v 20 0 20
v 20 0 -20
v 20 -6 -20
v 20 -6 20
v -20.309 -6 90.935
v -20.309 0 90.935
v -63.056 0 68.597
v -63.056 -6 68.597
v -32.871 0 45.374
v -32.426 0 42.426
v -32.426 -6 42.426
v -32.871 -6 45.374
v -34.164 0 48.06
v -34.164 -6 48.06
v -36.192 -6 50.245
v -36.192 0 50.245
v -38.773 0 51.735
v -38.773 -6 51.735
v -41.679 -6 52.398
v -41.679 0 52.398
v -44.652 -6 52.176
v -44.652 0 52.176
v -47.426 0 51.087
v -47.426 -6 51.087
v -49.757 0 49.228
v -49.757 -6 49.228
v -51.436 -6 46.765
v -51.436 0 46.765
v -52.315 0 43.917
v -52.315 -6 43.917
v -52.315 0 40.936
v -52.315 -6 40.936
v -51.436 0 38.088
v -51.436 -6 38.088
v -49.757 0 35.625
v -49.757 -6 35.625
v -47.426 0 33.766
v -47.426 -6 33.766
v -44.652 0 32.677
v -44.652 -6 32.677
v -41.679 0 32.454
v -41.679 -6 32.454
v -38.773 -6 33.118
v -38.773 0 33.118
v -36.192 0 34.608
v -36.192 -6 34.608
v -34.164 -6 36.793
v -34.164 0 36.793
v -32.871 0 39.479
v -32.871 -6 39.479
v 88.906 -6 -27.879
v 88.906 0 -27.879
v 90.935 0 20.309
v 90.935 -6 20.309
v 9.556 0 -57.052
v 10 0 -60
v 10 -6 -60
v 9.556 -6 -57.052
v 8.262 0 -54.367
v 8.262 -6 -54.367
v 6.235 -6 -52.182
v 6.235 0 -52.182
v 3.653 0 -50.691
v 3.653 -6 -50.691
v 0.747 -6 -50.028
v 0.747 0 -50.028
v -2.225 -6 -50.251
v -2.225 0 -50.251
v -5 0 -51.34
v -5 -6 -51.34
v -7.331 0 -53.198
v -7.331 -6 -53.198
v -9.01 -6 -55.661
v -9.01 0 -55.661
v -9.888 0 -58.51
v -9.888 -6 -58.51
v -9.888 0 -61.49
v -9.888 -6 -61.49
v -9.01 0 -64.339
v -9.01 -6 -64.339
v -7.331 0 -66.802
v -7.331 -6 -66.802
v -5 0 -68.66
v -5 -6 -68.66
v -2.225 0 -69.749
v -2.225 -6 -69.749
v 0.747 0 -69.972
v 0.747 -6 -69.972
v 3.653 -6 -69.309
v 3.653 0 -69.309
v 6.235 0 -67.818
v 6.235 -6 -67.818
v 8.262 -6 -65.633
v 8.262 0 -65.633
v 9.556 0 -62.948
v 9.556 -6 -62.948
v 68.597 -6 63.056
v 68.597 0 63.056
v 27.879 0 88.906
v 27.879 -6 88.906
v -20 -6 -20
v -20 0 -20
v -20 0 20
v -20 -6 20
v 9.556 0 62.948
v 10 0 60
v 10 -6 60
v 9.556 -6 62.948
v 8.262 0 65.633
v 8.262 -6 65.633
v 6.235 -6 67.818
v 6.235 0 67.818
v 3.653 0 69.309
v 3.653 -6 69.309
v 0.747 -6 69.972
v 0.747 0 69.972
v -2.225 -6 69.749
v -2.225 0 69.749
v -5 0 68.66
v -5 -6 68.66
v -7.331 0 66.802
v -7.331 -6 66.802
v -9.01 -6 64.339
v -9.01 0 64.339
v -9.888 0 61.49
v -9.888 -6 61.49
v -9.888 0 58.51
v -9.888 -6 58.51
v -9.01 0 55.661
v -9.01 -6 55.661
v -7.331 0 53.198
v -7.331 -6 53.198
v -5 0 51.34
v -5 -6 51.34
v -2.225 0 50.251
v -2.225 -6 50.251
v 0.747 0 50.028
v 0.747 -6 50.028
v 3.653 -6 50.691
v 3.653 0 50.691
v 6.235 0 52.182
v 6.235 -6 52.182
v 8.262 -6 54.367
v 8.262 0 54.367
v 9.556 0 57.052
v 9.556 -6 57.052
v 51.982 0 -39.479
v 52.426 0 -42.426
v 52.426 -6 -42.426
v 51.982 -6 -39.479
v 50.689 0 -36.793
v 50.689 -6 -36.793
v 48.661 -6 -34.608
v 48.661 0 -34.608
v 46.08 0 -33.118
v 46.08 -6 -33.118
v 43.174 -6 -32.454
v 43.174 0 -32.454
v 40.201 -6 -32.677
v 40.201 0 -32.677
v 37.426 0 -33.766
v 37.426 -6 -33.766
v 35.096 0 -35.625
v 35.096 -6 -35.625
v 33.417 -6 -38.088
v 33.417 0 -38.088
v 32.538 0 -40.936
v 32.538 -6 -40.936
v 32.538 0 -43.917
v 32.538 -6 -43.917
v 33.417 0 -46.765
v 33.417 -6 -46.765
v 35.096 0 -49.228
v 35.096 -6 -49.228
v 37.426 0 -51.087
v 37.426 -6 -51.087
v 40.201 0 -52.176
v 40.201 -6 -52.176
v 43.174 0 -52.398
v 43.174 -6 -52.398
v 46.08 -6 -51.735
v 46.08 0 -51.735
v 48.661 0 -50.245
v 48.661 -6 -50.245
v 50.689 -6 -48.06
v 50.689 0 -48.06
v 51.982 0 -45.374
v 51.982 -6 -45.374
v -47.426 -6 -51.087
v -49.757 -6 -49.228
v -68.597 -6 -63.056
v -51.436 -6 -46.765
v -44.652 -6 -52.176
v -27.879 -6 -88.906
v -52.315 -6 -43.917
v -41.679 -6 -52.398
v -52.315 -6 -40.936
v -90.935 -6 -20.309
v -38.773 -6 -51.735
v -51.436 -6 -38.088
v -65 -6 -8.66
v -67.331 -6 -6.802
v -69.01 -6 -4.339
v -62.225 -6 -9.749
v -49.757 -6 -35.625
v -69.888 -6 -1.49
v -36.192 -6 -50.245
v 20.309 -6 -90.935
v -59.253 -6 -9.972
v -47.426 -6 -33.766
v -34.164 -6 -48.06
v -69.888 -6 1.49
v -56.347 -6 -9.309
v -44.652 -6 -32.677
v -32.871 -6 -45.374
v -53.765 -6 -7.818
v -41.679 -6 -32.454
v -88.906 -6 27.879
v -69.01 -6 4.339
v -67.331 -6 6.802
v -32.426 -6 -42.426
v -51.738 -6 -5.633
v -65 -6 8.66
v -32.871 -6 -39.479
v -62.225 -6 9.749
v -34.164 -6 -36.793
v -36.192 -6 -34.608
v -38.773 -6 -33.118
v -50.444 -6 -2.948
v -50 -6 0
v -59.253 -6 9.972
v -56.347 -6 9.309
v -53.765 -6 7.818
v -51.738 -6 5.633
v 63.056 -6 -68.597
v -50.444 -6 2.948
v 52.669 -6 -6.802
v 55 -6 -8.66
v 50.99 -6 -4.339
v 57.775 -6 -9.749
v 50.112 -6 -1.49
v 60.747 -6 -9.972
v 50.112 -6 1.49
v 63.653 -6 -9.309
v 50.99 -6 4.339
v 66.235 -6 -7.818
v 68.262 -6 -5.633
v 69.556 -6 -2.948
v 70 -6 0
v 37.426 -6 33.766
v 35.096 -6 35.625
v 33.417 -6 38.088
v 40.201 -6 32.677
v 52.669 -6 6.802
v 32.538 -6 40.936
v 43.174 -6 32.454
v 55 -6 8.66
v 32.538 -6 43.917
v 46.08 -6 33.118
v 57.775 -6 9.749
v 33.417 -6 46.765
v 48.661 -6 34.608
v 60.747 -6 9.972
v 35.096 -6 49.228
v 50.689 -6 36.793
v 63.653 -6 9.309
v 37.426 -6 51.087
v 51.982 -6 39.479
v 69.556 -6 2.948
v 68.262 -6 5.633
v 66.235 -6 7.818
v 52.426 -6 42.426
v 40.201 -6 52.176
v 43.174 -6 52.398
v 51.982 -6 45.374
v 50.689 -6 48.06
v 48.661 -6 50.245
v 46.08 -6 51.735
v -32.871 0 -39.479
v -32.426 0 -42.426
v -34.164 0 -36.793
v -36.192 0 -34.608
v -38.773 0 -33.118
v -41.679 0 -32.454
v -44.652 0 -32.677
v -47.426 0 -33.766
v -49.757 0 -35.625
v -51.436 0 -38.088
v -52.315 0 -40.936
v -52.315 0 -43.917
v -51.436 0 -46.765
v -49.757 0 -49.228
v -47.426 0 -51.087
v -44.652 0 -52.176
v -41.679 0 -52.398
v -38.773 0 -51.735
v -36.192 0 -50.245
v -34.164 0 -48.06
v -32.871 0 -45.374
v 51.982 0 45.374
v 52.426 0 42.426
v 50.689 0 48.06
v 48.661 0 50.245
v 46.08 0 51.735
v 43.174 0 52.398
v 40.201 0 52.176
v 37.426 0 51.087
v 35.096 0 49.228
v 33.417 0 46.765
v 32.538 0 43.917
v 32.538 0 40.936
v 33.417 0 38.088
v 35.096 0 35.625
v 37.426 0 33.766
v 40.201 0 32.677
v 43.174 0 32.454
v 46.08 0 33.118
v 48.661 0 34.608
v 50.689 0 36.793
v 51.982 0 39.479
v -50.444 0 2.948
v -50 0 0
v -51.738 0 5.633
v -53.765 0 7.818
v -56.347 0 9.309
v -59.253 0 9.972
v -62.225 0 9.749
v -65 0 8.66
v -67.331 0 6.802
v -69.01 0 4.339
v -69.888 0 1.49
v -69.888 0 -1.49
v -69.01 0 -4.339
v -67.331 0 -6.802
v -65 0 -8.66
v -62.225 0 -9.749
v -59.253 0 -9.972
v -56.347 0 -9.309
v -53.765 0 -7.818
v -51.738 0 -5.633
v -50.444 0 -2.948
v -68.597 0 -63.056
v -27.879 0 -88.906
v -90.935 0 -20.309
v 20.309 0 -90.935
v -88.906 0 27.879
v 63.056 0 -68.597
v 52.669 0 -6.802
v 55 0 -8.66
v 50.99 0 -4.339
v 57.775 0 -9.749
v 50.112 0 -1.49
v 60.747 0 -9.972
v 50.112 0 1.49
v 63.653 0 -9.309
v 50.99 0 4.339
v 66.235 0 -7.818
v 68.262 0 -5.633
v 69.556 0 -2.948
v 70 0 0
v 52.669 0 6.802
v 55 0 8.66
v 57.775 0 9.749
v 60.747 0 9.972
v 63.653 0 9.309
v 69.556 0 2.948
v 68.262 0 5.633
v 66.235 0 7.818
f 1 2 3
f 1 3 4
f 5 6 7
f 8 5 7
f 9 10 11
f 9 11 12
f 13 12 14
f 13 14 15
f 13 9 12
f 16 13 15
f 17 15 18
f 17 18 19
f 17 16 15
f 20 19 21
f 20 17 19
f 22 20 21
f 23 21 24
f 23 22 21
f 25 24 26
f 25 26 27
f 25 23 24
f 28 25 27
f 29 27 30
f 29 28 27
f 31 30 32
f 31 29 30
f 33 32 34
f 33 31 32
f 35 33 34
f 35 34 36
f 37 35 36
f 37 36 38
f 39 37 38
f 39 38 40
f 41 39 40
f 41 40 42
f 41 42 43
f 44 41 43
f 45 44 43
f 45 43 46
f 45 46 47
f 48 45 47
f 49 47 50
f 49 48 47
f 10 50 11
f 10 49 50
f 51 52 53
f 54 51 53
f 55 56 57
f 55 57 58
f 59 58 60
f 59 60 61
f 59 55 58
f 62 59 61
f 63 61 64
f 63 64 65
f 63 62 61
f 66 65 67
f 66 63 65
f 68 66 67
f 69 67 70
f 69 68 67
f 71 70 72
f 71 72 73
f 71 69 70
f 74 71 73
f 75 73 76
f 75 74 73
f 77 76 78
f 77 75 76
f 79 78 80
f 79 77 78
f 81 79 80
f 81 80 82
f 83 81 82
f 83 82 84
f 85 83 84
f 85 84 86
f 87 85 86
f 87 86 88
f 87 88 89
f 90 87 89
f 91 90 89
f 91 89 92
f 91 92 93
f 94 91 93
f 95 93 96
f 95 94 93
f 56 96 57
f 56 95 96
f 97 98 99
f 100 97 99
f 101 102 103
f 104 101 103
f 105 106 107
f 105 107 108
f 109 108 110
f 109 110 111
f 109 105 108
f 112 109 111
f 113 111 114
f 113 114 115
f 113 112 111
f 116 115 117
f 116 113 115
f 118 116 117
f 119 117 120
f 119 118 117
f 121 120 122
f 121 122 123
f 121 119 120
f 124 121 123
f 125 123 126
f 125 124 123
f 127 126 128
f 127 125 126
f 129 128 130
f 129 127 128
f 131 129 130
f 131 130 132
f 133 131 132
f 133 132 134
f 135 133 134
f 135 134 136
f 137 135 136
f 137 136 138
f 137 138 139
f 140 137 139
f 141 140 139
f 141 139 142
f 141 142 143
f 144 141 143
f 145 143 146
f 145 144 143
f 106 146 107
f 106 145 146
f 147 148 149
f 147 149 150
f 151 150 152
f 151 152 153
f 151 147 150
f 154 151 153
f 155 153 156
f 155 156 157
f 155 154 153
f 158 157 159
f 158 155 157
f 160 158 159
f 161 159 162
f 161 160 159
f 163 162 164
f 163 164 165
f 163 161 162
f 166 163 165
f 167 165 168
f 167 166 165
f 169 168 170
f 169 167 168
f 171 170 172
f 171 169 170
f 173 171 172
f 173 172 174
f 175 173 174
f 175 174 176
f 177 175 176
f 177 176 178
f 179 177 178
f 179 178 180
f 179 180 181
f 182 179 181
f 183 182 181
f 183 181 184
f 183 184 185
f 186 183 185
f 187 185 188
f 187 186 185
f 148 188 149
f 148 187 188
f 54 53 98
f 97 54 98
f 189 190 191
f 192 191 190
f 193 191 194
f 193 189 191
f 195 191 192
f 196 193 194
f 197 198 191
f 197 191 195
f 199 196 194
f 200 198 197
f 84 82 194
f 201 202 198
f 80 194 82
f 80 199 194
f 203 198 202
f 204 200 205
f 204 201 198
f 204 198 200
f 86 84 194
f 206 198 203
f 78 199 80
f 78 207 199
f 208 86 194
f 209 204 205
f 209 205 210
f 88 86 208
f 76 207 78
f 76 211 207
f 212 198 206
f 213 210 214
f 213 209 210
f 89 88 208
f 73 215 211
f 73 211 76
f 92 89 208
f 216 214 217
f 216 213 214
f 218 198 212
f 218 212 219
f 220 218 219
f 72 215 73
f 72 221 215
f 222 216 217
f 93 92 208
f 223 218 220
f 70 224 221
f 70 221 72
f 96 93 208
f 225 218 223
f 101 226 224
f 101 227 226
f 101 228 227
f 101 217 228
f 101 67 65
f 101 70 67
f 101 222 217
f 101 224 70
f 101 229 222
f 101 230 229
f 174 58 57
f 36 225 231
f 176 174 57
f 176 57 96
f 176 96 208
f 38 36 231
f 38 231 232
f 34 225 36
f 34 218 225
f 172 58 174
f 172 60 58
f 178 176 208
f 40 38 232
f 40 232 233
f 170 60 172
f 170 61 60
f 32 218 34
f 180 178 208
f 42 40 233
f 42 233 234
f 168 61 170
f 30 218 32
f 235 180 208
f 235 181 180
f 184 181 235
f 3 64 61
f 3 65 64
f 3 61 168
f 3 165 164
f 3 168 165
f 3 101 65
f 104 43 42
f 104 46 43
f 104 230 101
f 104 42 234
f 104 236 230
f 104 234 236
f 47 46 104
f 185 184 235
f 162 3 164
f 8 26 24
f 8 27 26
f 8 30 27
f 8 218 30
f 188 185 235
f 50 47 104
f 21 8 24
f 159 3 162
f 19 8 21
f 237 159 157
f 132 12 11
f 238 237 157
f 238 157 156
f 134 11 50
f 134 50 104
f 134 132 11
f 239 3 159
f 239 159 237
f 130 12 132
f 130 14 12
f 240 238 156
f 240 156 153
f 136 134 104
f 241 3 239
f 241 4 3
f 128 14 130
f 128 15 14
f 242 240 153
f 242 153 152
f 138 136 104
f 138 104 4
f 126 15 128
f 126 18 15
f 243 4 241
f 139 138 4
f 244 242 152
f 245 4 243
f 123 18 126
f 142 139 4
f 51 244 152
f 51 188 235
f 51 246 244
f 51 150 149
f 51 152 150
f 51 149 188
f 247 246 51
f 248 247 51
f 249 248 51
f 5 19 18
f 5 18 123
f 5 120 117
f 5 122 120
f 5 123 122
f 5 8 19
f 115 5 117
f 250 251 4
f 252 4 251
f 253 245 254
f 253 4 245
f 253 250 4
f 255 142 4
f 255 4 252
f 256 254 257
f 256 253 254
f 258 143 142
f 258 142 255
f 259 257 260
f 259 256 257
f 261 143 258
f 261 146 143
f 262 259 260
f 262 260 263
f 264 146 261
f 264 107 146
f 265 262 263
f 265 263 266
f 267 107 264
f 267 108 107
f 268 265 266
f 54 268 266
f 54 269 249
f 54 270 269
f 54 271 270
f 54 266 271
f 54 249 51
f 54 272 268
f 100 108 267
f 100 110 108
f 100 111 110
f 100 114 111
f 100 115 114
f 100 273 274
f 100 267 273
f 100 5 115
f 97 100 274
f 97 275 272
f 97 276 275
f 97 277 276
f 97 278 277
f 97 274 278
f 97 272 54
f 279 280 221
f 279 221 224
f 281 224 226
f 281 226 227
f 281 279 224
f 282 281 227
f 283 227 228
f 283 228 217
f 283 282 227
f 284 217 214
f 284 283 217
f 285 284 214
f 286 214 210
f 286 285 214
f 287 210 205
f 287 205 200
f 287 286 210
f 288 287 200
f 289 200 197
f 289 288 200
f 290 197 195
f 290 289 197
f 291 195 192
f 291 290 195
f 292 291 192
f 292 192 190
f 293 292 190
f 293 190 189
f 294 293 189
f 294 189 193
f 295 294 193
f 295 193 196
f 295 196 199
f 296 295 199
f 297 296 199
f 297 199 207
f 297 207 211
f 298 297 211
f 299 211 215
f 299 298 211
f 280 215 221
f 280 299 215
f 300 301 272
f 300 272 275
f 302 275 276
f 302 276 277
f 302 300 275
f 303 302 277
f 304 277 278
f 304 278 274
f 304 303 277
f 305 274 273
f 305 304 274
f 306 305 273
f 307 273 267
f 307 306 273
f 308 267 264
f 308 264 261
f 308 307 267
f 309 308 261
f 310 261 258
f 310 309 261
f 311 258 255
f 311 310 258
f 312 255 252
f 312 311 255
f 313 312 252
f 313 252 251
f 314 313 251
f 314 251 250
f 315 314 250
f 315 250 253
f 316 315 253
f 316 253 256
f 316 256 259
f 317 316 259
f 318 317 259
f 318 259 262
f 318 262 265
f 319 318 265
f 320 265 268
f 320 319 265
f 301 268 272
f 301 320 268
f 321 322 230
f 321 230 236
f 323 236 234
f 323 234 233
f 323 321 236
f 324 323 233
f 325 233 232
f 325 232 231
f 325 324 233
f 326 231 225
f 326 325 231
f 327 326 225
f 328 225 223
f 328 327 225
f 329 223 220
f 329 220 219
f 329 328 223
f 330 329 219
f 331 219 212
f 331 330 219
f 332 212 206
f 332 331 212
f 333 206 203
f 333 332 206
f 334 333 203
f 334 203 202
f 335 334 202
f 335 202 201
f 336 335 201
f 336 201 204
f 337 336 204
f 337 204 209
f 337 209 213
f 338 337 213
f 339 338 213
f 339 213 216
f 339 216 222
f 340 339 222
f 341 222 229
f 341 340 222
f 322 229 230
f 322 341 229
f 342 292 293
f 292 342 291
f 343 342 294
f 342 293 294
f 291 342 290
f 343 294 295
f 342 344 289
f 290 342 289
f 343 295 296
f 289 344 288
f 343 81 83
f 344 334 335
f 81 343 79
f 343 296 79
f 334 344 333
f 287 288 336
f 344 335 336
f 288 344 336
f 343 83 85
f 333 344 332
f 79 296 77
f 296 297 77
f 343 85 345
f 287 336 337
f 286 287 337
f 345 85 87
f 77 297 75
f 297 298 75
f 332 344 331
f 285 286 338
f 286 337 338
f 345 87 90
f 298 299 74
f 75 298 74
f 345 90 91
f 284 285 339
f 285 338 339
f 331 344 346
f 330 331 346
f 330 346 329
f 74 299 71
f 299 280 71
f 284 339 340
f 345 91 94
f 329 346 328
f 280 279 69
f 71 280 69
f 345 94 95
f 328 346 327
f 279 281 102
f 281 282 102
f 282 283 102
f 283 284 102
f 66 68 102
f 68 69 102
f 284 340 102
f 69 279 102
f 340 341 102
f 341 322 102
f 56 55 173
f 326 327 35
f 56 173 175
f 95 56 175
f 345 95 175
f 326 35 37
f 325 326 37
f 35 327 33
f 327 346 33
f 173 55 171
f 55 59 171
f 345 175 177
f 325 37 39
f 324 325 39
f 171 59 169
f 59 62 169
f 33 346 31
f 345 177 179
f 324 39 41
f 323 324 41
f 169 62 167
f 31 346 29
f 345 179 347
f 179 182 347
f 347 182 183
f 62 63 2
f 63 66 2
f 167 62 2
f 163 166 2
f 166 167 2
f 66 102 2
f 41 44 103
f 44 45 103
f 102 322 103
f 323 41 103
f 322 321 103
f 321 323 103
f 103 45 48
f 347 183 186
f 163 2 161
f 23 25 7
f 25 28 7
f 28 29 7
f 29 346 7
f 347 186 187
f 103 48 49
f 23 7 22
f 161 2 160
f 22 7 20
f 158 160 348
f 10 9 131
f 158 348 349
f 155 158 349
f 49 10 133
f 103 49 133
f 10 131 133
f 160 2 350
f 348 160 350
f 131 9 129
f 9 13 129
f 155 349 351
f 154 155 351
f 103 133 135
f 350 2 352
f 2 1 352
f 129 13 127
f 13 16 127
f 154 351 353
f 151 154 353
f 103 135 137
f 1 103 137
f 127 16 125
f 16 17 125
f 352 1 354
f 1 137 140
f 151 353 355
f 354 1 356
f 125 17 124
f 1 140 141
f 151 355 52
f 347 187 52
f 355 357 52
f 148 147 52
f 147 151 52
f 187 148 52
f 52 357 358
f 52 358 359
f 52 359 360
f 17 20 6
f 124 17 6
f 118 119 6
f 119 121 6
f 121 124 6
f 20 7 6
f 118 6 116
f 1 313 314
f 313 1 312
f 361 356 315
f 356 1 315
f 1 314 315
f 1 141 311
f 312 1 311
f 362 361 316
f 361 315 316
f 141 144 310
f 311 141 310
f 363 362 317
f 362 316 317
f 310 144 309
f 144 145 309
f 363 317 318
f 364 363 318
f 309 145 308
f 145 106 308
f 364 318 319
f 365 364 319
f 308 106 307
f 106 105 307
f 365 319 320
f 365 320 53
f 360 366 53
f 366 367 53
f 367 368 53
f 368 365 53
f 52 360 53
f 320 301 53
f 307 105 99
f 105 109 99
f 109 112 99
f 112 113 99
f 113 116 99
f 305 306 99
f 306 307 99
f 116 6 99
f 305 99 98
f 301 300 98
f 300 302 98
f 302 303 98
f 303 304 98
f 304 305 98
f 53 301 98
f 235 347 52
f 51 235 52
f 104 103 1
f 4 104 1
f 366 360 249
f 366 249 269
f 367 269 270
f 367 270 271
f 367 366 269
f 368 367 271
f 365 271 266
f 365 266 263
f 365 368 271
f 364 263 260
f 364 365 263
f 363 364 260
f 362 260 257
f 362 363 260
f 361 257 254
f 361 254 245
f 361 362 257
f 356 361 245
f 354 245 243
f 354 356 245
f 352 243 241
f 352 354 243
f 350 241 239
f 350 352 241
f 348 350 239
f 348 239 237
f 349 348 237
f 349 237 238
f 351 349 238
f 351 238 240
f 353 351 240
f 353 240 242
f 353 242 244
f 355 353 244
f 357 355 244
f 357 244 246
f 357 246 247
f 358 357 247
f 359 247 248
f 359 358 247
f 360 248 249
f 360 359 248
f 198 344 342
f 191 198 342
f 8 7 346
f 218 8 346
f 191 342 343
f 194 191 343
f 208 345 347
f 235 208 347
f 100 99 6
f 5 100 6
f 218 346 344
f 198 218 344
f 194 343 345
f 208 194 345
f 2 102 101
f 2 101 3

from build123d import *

# Parameters (mm, degrees)
F0_R     = 10
F0_W     = 40
F0_H     = 40
F1_DEPTH = 6


with BuildPart() as f1:
    # F0 (on Front) → F1 (new body)
    with BuildSketch(Plane.XZ):
        Polygon((20.309229, -90.934532), (63.055574, -68.597), (88.906229, -27.878958), (90.934532, 20.309229), (68.597, 63.055574), (27.878958, 88.906229), (-20.309229, 90.934532), (-63.055574, 68.597), (-88.906229, 27.878958), (-90.934532, -20.309229), (-68.597, -63.055574), (-27.878958, -88.906229), align=None)
        with Locations((-42.426407, -42.426407)):
            Circle(F0_R, mode=Mode.SUBTRACT)
        with Locations((0, -60)):
            Circle(F0_R, mode=Mode.SUBTRACT)
        with Locations((42.426407, -42.426407)):
            Circle(F0_R, mode=Mode.SUBTRACT)
        with Locations((-60, 0)):
            Circle(F0_R, mode=Mode.SUBTRACT)
        with Locations((-42.426407, 42.426407)):
            Circle(F0_R, mode=Mode.SUBTRACT)
        Rectangle(F0_W, F0_H, mode=Mode.SUBTRACT)
        with Locations((42.426407, 42.426407)):
            Circle(F0_R, mode=Mode.SUBTRACT)
        with Locations((60, 0)):
            Circle(F0_R, mode=Mode.SUBTRACT)
        with Locations((0, 60)):
            Circle(F0_R, mode=Mode.SUBTRACT)
    extrude(amount=F1_DEPTH)


solid = f1.part
